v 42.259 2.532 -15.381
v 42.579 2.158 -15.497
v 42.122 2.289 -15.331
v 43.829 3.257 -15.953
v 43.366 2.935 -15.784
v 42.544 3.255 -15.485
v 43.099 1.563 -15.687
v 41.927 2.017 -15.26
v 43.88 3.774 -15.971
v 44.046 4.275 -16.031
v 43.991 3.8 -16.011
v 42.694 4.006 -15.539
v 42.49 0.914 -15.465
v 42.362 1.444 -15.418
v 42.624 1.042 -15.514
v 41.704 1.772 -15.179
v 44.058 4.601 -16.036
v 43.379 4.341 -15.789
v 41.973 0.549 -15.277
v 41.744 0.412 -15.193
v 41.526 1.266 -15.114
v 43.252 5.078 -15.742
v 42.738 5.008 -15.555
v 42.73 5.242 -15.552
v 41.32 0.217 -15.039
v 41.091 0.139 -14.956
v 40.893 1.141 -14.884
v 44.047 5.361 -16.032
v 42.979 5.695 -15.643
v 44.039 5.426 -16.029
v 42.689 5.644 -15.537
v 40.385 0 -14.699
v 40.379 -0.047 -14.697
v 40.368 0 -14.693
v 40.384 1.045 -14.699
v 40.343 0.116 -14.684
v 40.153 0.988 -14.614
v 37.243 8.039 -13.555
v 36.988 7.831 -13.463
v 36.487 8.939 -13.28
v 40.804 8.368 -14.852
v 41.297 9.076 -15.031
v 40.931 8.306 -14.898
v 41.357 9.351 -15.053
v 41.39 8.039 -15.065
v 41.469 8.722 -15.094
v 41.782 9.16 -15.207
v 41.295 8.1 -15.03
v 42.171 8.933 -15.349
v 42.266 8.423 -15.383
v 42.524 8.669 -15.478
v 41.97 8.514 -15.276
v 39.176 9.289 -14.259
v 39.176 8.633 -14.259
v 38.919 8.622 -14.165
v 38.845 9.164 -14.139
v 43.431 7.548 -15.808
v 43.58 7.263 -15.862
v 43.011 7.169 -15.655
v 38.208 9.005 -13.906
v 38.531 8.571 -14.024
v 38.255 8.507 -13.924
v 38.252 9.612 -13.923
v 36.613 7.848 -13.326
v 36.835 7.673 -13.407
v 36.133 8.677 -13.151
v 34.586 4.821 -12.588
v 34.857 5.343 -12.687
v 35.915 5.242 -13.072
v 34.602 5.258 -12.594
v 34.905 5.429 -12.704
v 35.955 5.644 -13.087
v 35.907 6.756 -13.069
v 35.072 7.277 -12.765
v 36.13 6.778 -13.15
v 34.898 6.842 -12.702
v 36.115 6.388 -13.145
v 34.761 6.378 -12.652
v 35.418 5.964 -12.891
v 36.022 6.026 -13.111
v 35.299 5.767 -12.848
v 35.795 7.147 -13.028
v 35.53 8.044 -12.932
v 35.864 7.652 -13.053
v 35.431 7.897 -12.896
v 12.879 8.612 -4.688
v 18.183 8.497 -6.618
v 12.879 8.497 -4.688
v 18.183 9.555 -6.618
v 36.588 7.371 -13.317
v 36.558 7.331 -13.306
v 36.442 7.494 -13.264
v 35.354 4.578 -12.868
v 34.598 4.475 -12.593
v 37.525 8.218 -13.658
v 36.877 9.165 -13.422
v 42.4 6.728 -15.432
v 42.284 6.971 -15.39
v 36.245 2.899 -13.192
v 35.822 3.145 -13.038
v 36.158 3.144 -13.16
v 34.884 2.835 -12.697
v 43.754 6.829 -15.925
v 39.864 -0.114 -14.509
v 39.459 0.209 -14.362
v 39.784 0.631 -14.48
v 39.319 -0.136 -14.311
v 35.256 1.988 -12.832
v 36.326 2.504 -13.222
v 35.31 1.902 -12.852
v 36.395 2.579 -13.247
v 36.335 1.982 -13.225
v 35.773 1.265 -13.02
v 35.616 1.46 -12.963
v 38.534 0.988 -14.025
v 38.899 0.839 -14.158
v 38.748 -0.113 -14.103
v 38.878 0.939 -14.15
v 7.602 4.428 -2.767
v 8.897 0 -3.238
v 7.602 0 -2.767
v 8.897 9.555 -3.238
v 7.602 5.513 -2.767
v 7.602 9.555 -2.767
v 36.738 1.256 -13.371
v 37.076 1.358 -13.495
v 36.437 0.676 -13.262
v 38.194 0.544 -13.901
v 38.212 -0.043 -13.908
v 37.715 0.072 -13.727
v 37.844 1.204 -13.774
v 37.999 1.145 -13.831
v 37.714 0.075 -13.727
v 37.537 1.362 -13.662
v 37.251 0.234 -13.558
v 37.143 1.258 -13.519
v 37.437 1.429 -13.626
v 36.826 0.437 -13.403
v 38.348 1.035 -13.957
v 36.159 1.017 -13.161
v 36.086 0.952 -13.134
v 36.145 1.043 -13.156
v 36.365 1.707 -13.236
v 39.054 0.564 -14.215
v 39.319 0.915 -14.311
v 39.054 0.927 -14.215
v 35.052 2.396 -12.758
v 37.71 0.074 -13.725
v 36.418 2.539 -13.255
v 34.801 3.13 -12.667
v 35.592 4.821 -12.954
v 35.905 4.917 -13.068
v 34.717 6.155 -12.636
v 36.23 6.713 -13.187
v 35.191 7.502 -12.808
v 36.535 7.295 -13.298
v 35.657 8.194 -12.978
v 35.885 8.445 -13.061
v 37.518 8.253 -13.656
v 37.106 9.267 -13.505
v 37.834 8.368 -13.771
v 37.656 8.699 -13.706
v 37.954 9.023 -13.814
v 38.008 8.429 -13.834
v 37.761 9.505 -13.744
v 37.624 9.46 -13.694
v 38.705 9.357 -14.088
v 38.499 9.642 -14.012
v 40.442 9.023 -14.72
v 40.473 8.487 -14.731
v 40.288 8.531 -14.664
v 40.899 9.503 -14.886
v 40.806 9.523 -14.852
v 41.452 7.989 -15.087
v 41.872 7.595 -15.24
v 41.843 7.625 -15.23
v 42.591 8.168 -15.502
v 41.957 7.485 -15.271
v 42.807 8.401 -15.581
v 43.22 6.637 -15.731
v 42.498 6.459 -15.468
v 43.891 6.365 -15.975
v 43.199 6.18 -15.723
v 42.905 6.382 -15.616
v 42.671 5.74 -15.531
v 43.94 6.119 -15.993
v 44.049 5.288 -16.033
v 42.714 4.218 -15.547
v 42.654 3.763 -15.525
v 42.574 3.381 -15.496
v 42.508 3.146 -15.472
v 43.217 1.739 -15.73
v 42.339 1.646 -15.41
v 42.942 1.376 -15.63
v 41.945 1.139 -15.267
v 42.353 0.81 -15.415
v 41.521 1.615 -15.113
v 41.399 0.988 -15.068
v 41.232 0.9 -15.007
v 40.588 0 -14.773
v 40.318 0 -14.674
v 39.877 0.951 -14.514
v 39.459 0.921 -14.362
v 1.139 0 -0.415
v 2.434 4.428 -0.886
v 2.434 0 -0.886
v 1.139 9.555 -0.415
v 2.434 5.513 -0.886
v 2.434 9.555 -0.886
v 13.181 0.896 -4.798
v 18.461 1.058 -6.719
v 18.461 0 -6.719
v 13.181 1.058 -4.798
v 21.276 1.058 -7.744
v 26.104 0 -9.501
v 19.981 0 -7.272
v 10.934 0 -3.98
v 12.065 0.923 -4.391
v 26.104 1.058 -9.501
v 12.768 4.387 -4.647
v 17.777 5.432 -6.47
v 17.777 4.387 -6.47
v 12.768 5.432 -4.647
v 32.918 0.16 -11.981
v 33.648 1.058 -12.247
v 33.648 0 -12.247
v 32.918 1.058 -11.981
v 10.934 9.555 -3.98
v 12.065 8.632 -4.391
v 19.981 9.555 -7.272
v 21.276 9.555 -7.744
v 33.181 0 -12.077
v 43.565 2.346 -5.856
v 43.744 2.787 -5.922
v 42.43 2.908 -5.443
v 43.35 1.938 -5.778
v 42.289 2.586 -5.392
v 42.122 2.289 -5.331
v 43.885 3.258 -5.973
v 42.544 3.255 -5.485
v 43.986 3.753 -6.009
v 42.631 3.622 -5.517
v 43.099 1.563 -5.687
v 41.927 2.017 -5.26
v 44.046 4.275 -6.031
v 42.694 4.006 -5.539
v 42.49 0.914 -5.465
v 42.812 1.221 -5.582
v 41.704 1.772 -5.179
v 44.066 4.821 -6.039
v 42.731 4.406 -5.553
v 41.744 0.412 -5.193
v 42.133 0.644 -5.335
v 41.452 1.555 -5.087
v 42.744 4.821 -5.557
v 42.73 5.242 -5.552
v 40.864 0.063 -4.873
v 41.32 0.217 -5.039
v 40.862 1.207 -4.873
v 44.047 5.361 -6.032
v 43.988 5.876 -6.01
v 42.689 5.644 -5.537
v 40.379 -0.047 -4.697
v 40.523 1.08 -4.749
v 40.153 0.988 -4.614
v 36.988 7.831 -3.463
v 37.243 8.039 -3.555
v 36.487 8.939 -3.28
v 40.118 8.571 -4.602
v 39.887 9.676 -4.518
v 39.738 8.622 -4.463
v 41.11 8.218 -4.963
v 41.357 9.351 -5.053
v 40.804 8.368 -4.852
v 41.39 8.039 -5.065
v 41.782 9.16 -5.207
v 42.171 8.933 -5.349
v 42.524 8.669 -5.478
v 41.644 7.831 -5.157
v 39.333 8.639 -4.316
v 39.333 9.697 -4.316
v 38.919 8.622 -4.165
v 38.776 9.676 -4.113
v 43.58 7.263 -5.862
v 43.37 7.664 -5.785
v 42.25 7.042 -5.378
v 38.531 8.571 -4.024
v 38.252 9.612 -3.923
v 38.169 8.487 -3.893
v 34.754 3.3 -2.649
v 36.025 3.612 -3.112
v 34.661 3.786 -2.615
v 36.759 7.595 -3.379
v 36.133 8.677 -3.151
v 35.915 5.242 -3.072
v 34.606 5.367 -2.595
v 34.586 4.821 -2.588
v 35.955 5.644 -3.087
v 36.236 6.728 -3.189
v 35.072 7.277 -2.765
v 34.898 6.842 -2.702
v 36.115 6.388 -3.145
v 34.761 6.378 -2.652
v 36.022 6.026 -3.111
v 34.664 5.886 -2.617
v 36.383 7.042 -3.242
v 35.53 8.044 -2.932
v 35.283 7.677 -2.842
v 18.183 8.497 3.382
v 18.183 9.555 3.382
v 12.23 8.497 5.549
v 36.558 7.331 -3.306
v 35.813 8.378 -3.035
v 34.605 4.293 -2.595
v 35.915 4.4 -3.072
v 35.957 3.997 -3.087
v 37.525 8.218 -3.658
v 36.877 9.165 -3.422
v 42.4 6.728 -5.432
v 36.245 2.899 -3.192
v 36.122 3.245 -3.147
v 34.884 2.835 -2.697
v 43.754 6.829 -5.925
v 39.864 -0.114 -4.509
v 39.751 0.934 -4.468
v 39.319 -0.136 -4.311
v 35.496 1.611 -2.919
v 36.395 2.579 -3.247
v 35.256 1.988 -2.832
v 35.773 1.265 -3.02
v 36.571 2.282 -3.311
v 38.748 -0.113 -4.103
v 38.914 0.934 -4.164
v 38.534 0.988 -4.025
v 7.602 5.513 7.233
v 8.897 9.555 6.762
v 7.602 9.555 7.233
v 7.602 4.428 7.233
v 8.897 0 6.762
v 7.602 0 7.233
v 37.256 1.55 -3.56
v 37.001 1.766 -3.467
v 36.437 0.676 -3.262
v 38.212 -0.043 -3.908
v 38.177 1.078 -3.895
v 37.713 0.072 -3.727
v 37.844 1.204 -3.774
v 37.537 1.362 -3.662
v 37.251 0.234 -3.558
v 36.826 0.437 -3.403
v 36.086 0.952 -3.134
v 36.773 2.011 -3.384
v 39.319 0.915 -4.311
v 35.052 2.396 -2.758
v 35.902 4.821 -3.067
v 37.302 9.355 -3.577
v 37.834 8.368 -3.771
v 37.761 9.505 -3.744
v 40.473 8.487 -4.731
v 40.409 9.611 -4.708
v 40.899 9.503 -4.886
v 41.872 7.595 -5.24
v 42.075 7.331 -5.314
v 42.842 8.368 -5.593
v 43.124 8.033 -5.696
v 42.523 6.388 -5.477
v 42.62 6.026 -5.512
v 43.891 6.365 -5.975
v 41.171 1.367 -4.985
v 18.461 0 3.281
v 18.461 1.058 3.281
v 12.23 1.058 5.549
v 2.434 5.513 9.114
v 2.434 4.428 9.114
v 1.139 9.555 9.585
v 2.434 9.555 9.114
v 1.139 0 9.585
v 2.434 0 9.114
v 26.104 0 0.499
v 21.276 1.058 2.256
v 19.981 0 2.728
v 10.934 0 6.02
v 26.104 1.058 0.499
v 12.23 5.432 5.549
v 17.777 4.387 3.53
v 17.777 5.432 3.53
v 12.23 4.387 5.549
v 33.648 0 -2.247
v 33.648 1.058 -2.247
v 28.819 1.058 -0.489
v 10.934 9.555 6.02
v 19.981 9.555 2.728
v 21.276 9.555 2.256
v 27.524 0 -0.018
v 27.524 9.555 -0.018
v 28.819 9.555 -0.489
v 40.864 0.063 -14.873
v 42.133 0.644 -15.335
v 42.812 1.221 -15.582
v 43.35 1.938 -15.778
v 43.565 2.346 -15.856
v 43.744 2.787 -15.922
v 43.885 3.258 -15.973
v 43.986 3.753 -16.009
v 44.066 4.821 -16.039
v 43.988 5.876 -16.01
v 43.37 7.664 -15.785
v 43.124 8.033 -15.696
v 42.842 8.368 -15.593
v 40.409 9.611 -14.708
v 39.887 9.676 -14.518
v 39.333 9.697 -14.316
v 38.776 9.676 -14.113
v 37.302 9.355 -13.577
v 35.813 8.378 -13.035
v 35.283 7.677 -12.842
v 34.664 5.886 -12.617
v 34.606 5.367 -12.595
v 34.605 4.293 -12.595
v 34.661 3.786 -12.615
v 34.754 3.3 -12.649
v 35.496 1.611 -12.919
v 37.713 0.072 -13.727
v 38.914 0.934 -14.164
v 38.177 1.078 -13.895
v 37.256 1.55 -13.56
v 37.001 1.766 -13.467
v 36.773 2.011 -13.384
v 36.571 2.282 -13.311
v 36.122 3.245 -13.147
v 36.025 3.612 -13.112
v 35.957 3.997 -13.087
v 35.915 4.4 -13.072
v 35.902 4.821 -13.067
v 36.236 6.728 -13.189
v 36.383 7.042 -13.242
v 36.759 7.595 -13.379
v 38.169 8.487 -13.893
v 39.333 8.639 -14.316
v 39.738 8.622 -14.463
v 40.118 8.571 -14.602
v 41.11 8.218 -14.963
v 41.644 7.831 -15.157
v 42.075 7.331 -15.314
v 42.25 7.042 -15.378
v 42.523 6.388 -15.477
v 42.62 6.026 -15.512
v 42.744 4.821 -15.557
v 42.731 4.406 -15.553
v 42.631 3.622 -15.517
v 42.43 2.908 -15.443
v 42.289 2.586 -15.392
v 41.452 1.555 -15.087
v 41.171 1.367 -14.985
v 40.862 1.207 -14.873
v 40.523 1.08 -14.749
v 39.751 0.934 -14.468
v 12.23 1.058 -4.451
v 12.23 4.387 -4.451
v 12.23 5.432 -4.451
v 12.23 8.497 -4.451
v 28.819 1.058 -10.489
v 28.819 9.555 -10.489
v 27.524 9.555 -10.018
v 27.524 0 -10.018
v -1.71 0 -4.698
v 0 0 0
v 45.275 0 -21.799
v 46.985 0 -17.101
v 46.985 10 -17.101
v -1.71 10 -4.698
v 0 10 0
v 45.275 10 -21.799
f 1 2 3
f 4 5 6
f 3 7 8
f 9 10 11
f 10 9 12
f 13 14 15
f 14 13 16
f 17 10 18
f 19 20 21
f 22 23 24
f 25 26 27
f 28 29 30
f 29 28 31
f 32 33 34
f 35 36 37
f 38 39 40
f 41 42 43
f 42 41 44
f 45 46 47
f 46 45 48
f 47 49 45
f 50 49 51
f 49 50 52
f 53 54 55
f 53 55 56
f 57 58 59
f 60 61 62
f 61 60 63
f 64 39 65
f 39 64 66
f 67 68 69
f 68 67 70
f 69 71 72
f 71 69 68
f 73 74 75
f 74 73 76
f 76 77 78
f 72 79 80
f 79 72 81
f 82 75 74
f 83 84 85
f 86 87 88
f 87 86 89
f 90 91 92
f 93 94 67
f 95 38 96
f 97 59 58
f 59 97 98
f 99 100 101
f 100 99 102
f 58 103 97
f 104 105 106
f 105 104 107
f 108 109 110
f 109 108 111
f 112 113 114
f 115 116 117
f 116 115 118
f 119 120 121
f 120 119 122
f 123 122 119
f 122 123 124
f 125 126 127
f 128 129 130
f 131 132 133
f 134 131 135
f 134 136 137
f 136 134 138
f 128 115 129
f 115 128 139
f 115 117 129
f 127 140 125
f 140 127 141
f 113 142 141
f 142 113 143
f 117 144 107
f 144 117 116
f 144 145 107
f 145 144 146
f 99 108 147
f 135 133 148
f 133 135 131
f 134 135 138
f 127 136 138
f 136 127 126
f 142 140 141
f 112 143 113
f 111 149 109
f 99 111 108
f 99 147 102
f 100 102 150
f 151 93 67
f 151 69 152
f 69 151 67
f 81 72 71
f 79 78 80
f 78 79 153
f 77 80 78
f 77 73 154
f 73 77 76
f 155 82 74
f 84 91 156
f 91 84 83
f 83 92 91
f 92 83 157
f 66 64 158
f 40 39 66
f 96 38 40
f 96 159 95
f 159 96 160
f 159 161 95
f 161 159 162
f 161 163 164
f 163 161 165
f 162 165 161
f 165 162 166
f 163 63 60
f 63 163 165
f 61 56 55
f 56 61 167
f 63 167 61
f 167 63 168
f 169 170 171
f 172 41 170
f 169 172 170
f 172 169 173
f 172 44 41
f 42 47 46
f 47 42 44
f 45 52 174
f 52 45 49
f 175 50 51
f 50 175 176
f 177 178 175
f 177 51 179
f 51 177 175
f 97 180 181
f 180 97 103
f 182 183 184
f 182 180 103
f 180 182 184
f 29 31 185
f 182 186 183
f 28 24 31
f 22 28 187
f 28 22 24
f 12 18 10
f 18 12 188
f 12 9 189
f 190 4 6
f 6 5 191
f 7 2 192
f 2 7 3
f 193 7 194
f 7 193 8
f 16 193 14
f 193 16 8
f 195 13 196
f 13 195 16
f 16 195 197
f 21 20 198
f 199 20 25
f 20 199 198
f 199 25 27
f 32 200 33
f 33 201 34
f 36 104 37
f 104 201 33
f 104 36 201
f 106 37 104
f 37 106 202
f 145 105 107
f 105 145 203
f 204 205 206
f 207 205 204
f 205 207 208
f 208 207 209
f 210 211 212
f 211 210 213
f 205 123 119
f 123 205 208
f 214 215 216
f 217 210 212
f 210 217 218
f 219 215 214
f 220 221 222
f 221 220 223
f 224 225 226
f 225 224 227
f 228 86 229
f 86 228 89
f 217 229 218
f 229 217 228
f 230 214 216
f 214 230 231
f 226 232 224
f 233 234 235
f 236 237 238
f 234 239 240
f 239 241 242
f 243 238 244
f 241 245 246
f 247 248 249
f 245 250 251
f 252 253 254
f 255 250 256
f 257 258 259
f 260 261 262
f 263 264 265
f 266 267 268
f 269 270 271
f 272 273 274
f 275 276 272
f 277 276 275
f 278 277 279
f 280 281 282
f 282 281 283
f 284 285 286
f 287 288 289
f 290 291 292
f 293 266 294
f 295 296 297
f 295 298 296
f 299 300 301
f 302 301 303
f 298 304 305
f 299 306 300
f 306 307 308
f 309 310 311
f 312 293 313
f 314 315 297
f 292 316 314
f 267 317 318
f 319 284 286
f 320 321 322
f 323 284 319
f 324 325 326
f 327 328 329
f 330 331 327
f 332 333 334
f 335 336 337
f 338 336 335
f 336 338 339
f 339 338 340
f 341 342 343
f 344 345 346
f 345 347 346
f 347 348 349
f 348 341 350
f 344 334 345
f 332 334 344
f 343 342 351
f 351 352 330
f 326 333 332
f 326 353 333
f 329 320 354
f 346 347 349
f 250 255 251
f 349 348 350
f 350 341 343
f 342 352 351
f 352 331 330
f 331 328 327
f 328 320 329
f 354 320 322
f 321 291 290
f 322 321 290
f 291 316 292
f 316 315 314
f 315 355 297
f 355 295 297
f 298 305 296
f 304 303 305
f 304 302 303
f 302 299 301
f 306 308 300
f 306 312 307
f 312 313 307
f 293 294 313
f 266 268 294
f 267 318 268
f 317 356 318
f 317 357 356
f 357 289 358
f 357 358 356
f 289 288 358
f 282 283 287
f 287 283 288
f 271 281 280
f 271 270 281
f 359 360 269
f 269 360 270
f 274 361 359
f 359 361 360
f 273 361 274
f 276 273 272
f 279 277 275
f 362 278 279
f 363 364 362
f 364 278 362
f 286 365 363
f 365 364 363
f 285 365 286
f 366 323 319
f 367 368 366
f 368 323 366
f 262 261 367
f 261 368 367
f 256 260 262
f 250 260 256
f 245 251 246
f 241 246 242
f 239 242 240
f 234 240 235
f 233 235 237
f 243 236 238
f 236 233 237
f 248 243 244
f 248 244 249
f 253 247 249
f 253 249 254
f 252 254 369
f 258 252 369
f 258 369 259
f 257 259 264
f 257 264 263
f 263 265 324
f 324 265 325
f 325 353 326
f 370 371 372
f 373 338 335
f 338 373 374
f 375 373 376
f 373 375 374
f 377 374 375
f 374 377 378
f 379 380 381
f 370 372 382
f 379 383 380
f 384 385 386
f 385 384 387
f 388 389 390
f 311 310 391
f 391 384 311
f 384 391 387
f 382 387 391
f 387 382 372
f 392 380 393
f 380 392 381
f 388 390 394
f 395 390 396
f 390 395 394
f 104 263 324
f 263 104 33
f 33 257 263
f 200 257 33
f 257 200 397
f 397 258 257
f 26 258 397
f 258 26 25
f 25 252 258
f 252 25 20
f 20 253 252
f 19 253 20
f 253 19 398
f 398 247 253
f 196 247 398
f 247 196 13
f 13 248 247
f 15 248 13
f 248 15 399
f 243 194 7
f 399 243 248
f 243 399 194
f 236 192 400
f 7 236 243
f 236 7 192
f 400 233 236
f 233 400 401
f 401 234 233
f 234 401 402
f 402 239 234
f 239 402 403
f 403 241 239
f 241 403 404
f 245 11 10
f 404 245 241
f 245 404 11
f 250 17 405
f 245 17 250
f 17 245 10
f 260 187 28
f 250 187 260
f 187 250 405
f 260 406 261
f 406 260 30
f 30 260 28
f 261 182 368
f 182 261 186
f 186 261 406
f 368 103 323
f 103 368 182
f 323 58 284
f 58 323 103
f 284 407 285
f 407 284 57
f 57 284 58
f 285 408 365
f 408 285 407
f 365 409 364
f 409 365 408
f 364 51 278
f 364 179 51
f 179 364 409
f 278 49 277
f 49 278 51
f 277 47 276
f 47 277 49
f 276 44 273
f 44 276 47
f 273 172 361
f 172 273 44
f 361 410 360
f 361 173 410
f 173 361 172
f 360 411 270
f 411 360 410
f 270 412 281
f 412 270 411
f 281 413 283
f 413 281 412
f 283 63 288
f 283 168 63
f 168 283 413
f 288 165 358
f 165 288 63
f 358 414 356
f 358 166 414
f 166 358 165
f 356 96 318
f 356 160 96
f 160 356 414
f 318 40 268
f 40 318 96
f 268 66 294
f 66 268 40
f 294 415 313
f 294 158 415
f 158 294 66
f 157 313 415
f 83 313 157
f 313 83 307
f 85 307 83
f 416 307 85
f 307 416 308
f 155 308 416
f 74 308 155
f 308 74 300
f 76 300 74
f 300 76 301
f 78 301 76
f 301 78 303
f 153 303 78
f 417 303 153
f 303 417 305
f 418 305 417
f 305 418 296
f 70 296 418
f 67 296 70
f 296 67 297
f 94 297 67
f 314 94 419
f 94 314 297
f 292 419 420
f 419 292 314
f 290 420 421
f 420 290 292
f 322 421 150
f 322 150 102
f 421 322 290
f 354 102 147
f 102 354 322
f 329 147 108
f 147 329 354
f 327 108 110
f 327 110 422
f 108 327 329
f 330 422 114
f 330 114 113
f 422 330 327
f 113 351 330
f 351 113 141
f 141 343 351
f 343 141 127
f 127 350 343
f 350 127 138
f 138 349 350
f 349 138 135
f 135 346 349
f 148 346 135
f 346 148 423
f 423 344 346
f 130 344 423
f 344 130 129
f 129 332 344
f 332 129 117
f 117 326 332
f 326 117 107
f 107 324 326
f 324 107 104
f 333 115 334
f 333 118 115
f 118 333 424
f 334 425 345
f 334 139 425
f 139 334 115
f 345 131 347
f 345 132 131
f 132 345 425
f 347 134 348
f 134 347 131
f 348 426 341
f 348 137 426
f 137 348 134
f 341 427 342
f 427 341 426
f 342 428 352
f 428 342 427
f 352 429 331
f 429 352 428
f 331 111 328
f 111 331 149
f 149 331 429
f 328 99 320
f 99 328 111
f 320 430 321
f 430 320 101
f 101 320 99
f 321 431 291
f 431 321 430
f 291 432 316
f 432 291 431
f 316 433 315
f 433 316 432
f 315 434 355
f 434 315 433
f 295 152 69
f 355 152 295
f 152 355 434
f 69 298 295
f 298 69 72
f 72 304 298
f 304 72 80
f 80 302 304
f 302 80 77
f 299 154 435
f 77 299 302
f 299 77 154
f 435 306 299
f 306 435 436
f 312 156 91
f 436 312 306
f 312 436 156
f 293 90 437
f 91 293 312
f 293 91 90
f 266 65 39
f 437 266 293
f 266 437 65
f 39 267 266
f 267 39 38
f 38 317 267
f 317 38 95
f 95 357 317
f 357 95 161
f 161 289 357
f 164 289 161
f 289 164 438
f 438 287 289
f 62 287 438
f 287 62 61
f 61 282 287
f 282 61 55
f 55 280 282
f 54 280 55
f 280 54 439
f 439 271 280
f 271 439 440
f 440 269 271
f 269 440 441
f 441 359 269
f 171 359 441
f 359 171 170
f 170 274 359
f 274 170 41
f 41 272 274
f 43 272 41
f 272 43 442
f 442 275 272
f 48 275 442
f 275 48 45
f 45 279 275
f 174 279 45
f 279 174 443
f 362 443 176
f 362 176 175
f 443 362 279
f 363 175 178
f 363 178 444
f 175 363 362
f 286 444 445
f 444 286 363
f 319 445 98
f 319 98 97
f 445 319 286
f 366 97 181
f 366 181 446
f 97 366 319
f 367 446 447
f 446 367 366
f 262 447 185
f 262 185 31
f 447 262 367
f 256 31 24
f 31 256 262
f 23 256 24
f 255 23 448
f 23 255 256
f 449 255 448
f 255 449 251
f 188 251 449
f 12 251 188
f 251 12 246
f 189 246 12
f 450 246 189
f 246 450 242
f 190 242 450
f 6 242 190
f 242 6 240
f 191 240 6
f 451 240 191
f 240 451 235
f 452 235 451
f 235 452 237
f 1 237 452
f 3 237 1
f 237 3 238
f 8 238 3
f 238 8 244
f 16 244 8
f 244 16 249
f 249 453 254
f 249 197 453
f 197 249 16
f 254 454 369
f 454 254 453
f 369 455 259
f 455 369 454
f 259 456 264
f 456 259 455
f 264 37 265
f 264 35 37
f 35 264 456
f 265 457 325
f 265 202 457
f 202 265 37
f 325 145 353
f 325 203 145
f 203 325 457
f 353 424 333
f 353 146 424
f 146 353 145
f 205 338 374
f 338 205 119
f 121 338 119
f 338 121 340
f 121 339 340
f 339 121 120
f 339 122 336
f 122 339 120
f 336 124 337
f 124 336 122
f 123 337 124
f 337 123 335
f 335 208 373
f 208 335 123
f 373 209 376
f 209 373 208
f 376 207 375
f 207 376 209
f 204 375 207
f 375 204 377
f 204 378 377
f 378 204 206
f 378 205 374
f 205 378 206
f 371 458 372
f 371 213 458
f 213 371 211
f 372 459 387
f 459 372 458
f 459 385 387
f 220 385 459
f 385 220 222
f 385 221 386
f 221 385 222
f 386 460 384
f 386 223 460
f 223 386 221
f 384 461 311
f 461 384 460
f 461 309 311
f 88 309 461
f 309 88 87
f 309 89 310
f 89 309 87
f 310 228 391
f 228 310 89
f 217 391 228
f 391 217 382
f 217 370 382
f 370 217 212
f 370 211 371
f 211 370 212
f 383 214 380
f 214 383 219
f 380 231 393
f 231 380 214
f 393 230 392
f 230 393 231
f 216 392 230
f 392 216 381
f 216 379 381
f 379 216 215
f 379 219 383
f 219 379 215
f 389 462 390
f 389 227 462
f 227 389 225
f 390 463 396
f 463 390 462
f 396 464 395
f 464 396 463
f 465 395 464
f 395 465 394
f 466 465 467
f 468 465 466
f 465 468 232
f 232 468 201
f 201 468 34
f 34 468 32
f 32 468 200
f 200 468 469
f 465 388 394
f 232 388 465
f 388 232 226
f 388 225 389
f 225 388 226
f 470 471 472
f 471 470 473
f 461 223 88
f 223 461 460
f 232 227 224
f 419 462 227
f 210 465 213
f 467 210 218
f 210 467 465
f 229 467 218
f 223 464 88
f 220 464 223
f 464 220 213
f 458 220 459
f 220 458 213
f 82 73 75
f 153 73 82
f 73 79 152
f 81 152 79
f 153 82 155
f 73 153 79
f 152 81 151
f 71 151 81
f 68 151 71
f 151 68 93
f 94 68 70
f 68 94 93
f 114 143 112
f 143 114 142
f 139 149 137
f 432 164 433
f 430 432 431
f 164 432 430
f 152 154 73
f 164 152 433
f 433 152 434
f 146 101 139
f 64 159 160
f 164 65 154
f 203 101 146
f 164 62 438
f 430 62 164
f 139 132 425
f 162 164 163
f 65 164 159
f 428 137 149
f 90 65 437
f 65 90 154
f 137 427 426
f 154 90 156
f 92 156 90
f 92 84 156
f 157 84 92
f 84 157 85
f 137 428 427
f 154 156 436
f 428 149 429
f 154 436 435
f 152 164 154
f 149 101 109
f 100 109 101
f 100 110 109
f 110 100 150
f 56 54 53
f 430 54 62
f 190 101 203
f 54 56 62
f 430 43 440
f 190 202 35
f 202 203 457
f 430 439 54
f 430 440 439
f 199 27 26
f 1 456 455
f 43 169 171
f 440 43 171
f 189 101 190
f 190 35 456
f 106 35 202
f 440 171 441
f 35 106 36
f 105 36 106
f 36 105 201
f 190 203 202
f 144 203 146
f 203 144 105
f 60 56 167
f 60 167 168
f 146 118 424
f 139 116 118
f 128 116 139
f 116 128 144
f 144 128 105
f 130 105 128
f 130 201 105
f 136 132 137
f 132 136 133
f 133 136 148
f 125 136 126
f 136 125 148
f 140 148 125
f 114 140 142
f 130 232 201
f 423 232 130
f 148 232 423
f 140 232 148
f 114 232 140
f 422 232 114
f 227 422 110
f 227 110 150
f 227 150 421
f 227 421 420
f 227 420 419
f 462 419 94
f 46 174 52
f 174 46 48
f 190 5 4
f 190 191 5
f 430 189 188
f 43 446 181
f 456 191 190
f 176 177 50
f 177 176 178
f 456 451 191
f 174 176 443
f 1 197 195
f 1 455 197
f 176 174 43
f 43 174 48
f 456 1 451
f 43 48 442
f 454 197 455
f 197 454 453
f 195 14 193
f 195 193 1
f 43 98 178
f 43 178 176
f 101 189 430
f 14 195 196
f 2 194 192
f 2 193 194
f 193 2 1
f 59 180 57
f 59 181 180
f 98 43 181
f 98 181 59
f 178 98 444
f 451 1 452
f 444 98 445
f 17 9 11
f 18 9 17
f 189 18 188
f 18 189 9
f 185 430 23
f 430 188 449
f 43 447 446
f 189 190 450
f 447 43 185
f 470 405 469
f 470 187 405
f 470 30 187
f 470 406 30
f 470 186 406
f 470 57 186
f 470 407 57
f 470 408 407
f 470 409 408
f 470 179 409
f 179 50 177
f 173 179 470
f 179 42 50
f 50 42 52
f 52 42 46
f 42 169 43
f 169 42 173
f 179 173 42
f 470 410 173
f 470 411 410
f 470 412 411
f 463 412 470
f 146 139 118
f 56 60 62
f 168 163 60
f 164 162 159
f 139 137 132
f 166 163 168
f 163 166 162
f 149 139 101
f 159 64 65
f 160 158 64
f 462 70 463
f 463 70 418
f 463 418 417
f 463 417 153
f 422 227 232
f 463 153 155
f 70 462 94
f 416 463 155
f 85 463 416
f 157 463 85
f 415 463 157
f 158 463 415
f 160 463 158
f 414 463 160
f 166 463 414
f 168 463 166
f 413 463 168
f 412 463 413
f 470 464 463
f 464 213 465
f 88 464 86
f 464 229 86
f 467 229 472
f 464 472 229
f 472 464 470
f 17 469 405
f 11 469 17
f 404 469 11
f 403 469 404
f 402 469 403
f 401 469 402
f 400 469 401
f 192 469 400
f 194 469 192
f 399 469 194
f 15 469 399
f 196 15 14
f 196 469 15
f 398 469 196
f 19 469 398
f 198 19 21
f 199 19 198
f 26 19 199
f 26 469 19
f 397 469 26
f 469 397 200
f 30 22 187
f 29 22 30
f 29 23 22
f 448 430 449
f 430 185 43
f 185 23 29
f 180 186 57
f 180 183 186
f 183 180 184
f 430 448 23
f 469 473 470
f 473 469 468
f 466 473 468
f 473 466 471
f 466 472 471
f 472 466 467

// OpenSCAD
A = -20;

shearAlongZ(A)
linear_extrude(10)
text("HELLO");

rotate([0, -A, 0])
color("pink")
translate([0, 0, -5])
cube([50, 10, 5]);


module shearAlongZ(ang) {
  multmatrix([
    [1,        0, 0, 0],
    [0,        1, 0, 0],
    [tan(ang), 0, 1, 0]
  ])
  children();
}
